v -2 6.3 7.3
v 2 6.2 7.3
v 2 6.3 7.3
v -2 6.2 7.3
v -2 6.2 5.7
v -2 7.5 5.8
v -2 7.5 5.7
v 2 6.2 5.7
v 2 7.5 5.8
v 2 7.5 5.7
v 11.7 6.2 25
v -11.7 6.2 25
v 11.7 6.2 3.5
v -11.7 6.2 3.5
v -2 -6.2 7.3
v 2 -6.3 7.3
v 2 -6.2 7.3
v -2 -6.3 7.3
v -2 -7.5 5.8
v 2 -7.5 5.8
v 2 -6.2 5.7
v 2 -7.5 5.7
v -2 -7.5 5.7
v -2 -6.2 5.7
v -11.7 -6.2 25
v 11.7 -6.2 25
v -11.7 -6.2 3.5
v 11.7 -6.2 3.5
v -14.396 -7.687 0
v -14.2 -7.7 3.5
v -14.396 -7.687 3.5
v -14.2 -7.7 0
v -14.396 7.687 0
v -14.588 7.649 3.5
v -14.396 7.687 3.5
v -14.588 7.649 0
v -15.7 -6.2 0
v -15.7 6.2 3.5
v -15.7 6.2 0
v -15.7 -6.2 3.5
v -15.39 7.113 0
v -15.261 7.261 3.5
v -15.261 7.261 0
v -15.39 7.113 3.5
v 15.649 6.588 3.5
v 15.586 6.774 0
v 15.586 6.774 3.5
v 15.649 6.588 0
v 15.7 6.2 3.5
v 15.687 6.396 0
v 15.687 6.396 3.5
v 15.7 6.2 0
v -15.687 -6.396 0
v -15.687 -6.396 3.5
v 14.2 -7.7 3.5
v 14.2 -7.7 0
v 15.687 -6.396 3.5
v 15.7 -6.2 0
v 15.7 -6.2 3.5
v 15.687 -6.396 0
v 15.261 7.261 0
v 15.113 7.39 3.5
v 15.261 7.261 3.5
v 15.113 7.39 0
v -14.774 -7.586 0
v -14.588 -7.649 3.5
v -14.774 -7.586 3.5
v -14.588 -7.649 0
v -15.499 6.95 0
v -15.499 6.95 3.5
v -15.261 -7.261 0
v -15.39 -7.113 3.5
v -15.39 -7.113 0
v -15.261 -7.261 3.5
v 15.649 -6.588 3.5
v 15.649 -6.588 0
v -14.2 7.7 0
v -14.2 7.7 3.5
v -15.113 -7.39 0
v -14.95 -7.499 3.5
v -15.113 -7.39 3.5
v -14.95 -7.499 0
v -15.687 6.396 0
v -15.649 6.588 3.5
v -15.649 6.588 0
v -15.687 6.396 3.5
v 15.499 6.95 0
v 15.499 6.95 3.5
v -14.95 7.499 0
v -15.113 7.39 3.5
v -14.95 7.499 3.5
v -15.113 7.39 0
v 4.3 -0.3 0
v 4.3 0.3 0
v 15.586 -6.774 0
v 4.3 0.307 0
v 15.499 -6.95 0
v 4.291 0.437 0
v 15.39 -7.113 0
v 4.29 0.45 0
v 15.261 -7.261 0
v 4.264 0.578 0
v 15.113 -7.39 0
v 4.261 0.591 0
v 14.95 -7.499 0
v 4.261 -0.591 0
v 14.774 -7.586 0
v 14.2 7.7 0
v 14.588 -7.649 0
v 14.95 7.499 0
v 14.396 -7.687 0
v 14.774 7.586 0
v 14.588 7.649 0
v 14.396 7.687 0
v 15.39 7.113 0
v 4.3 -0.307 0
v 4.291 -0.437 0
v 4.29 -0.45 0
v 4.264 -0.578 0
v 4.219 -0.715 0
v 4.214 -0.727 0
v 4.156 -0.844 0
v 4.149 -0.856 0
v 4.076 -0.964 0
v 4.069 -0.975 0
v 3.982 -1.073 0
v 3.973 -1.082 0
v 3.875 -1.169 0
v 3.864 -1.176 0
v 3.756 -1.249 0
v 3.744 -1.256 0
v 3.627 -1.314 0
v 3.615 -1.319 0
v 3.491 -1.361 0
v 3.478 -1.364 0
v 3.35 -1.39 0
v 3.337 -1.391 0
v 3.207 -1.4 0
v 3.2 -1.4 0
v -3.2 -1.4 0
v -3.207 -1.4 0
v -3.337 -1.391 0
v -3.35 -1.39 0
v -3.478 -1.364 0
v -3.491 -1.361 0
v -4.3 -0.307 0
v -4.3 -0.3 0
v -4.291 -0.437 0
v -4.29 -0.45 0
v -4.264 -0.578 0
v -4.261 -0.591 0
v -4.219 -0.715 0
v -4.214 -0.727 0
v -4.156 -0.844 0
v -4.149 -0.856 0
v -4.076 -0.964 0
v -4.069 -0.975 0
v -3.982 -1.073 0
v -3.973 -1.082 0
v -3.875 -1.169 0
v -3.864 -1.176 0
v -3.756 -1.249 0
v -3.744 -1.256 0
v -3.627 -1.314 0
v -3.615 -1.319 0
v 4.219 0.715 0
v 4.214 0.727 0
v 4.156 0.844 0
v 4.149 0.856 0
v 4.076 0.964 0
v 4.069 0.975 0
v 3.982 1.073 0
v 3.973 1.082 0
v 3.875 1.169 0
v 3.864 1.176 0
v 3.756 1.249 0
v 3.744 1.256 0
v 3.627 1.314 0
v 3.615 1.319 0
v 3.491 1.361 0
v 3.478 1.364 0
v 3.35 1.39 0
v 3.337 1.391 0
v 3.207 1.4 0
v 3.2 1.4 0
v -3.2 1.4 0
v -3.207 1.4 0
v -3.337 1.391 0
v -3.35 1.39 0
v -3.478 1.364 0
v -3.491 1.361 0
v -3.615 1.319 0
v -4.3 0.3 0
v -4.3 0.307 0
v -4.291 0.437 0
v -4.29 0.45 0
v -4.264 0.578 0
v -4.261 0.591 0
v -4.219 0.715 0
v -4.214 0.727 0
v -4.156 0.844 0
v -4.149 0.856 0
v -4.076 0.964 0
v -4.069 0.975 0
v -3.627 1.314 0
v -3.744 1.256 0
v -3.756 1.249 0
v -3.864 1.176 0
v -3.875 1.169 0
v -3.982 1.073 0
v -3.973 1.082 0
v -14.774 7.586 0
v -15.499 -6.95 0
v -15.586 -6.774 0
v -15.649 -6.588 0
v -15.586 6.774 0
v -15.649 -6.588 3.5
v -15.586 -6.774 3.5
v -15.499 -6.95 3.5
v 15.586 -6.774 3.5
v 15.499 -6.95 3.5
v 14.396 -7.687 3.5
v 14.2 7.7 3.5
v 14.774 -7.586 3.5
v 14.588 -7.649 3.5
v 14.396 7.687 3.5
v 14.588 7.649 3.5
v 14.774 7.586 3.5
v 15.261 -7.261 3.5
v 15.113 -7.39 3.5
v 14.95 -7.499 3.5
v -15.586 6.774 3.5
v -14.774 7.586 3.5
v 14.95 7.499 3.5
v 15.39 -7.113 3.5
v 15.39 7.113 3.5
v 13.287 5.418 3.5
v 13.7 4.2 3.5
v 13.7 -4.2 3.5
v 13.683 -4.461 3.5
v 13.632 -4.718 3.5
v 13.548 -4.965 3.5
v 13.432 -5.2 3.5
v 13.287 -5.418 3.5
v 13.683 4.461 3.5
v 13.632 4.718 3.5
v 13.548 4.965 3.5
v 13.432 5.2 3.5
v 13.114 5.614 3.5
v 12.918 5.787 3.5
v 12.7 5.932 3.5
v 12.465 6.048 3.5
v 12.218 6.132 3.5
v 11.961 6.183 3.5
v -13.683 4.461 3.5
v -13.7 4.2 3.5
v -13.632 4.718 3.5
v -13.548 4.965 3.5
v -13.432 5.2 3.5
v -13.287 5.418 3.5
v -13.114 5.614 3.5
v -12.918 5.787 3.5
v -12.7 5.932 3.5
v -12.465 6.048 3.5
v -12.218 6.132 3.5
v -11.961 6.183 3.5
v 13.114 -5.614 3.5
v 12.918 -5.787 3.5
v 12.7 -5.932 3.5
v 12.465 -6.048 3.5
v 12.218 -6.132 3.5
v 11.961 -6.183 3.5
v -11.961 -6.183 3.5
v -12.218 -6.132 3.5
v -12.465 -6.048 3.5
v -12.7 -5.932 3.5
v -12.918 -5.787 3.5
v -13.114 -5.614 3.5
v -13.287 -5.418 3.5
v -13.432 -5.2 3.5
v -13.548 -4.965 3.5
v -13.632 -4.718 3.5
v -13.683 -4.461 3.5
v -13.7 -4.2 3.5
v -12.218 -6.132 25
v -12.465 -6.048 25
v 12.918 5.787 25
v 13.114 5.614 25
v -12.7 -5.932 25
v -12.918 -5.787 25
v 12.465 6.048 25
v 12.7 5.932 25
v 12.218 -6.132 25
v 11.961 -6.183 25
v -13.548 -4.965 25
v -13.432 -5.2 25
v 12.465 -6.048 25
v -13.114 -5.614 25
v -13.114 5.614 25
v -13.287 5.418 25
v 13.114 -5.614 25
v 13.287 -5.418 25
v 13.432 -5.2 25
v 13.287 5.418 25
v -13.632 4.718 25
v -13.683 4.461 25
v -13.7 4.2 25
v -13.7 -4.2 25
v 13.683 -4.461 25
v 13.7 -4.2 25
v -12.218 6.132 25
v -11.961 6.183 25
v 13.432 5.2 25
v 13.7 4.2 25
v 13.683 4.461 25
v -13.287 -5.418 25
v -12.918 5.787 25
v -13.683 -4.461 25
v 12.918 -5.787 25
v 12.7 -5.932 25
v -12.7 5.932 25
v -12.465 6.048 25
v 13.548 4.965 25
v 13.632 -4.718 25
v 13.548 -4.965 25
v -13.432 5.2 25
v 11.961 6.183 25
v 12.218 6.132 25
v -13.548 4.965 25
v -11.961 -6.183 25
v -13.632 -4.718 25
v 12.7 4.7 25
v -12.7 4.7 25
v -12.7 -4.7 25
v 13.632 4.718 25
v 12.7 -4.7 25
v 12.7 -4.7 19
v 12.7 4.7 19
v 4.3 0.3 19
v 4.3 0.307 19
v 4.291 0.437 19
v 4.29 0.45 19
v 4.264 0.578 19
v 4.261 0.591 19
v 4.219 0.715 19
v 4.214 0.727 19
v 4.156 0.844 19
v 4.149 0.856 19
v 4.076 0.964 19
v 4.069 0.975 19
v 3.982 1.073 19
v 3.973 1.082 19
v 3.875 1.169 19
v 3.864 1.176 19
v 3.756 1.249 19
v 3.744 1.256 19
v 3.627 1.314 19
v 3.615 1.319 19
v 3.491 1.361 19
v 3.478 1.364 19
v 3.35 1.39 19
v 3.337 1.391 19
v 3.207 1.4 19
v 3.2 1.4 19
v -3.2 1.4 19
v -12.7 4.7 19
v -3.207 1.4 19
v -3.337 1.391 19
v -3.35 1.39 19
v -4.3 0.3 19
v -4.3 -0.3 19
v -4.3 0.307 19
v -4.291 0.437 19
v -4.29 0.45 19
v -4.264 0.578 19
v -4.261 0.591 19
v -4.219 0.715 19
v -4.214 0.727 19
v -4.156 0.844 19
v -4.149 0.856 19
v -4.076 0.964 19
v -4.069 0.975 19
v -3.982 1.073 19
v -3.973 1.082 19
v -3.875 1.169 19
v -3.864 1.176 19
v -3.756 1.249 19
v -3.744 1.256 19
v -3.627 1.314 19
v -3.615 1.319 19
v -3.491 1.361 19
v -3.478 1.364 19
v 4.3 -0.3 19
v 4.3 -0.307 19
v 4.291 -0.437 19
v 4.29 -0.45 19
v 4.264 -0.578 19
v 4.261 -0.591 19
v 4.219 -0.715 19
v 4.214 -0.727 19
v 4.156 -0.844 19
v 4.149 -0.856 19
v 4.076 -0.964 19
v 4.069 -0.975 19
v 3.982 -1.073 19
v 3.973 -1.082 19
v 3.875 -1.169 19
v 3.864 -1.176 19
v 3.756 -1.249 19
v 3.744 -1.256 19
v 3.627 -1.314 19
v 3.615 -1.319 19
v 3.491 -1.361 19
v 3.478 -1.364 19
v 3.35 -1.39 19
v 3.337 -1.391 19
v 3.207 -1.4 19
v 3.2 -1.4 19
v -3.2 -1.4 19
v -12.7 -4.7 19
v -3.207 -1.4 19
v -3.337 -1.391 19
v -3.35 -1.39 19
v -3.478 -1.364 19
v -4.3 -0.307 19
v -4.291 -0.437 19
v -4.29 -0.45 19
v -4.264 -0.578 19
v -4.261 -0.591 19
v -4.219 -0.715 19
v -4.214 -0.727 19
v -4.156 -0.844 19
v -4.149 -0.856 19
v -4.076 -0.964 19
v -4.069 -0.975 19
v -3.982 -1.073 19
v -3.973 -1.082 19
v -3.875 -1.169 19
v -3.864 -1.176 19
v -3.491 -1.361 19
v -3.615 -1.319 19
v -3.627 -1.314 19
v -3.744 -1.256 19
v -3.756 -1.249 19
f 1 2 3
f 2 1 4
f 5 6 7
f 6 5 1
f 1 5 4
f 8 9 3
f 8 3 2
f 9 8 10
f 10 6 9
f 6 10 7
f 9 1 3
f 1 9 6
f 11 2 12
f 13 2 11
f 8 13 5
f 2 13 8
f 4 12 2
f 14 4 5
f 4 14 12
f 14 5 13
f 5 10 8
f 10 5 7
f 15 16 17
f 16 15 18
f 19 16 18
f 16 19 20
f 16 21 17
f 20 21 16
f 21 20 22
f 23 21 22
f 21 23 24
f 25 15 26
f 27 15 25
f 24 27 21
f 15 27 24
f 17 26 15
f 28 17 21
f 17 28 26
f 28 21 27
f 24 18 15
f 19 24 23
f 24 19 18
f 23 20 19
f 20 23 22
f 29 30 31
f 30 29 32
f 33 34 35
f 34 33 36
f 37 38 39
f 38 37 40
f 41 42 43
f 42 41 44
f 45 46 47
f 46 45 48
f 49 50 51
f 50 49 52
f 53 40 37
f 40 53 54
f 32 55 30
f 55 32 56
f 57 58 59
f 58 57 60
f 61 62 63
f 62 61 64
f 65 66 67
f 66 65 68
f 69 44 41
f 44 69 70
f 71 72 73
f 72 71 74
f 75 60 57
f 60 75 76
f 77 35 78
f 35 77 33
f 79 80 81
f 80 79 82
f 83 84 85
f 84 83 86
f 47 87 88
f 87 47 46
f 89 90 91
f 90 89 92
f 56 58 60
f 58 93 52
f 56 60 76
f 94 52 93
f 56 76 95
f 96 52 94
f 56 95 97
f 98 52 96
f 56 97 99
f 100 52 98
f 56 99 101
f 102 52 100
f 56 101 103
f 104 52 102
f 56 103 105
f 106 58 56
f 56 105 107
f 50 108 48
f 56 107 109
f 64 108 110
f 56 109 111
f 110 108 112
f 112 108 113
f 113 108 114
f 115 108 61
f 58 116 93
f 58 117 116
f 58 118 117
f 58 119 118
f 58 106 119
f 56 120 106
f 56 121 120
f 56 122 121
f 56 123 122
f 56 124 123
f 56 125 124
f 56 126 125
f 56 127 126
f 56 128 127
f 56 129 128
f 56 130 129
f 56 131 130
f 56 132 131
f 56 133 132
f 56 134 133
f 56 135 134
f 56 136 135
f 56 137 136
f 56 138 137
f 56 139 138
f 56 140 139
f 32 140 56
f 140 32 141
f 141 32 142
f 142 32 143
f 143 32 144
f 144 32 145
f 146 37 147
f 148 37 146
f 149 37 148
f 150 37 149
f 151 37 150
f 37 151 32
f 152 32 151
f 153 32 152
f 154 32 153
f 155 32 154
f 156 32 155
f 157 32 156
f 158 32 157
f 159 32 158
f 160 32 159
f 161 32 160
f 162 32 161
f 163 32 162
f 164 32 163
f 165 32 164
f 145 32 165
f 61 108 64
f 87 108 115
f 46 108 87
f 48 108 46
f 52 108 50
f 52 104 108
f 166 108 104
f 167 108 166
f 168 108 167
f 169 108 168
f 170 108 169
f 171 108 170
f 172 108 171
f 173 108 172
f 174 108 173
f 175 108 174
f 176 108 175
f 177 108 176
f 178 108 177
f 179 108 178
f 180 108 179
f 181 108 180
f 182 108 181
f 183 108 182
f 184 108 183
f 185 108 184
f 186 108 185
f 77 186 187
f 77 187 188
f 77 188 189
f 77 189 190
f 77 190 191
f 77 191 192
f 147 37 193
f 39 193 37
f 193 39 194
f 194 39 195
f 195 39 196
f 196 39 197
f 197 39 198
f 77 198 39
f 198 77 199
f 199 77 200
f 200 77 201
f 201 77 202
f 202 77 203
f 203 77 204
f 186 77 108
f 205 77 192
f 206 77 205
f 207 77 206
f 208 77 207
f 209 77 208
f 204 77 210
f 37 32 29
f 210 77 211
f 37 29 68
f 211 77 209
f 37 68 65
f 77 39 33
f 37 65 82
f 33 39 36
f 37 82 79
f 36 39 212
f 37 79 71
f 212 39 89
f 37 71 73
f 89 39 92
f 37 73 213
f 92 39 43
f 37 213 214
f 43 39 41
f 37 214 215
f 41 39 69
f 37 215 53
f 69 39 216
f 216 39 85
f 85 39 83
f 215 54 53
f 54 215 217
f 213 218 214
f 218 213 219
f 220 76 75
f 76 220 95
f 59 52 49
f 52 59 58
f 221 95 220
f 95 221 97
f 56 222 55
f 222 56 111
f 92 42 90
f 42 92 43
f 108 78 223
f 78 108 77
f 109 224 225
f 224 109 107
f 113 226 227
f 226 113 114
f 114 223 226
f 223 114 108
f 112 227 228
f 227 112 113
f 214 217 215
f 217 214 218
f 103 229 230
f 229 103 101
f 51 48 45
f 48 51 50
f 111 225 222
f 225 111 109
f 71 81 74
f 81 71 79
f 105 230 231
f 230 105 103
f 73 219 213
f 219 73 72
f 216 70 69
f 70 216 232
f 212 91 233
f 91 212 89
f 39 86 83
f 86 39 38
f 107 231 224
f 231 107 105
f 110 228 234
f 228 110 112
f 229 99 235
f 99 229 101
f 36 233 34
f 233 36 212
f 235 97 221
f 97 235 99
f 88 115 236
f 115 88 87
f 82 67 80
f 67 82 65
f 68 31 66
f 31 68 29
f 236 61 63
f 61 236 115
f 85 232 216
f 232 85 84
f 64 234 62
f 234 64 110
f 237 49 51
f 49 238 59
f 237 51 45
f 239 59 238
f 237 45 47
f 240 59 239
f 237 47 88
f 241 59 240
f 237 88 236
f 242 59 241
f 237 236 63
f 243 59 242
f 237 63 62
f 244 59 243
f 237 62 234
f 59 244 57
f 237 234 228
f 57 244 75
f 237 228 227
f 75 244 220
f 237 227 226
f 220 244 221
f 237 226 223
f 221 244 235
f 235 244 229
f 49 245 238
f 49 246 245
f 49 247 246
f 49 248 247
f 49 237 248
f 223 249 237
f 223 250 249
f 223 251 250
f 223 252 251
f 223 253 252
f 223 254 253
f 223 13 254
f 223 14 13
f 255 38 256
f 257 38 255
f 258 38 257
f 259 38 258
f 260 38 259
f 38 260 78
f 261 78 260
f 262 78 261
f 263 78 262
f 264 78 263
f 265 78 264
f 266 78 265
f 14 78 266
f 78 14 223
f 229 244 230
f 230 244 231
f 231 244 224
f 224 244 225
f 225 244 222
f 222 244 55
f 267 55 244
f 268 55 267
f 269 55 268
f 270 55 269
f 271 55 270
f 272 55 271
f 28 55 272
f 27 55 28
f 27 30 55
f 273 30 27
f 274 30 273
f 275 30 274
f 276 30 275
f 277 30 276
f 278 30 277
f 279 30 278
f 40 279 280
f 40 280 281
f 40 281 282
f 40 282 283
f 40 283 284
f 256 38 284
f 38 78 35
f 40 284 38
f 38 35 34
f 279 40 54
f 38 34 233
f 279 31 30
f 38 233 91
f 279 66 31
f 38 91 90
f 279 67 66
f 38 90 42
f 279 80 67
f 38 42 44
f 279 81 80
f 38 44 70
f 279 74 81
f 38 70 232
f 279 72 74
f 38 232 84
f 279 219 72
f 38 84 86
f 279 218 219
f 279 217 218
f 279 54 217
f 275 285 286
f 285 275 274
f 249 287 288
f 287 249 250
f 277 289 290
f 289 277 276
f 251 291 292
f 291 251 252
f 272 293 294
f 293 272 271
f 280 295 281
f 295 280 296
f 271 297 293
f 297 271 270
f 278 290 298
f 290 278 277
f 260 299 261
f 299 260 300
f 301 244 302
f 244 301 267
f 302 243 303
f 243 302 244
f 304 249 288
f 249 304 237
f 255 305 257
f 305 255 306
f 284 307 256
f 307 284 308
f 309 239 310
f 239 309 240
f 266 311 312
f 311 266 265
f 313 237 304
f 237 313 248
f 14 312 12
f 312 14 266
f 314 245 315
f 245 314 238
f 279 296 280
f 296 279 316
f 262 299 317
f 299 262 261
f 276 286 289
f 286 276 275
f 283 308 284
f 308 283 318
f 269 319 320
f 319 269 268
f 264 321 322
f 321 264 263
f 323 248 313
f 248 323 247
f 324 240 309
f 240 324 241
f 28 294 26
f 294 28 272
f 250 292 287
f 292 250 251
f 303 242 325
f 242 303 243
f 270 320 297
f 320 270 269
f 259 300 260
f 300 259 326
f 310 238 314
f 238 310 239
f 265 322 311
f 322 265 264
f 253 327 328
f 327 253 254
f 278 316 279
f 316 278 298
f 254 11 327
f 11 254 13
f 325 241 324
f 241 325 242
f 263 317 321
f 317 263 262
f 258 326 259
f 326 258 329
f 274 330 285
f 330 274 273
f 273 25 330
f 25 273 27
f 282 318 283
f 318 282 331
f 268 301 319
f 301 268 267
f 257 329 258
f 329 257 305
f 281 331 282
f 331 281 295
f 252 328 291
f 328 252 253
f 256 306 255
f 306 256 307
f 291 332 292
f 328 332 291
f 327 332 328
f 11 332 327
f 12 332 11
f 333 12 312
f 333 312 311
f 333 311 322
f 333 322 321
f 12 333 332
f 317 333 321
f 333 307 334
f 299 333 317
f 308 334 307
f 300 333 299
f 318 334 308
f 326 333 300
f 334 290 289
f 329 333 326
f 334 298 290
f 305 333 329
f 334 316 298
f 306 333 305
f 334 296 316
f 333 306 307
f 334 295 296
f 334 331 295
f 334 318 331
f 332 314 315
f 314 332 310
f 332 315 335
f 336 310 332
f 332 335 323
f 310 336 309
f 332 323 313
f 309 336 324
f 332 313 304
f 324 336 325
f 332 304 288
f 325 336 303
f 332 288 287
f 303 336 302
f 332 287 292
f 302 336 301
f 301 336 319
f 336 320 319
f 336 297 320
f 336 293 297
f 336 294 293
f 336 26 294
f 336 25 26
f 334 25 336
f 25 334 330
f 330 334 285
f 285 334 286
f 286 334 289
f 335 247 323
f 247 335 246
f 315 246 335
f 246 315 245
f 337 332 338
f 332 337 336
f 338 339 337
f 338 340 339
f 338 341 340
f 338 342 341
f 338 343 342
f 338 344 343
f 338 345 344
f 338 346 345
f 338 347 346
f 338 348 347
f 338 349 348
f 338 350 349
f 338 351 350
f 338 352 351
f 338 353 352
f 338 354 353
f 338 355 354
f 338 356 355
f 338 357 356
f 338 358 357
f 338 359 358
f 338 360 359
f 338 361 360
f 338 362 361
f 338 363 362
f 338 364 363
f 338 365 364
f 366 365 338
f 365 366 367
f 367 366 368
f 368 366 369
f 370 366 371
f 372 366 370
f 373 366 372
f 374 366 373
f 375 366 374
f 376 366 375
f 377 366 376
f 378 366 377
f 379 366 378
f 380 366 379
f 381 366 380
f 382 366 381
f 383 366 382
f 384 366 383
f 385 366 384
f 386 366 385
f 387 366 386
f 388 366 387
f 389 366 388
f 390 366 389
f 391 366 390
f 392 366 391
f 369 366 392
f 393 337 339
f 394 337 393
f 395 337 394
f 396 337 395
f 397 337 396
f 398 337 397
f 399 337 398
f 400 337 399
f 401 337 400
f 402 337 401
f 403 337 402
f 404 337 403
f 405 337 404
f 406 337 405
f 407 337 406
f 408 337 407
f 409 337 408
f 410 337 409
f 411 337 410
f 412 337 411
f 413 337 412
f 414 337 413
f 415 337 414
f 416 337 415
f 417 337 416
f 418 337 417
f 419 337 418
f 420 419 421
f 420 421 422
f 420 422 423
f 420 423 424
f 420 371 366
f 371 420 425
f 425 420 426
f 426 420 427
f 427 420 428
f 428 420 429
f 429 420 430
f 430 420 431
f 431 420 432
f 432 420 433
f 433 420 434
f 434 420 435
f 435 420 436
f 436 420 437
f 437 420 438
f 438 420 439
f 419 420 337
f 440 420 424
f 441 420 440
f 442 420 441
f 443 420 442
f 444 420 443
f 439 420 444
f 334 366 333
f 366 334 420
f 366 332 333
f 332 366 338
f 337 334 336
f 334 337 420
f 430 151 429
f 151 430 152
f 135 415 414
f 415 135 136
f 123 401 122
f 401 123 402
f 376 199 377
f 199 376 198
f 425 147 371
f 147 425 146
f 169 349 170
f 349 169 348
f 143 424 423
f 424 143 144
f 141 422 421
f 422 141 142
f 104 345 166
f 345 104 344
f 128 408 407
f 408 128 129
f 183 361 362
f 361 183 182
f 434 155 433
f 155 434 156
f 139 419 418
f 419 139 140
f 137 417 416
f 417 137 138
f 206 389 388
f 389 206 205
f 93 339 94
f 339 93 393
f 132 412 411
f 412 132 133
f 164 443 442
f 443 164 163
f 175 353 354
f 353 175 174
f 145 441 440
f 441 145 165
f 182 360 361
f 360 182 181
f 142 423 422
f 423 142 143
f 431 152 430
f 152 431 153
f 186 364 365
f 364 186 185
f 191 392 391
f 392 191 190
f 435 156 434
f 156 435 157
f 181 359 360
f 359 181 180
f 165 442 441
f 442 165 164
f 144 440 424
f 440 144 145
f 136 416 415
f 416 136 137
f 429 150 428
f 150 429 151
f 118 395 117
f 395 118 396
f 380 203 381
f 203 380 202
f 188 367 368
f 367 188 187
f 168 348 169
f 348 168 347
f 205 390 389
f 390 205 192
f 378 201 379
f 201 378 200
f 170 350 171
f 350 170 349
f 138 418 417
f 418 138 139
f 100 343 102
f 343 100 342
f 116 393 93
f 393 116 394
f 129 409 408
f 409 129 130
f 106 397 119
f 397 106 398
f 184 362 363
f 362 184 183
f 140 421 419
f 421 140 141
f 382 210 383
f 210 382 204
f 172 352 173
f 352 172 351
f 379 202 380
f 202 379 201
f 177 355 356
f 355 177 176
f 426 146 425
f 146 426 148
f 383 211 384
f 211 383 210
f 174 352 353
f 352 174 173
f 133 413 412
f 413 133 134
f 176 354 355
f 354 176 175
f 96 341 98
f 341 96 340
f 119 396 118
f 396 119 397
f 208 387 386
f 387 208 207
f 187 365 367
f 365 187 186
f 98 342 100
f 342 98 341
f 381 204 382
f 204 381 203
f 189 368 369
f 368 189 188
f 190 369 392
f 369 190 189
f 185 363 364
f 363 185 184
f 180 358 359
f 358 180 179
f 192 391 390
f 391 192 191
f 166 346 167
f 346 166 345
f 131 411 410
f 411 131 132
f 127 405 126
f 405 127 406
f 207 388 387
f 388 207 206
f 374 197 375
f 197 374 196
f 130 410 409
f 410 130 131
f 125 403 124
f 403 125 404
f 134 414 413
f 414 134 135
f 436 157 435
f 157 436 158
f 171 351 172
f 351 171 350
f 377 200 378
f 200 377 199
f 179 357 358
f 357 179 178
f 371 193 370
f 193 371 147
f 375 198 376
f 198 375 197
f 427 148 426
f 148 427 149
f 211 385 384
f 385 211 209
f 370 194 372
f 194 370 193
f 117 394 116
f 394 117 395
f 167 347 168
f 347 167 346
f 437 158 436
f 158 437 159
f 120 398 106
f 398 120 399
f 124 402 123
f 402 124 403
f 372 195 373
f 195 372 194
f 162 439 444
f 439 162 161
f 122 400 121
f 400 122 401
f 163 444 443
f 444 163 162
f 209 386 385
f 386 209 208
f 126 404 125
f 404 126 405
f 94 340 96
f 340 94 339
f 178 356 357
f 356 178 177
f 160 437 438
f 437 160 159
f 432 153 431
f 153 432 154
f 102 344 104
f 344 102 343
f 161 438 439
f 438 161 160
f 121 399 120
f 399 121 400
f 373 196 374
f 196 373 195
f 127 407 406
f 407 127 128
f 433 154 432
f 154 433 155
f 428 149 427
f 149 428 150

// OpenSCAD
// file: parameters.scad
// ============================================
// MODULAR CABLE ORGANIZER - SHARED PARAMETERS
// ============================================
// All dimensions in mm - include this in all files
// ============================================

$fn = 48;

// === TOLERANCES ===
clearance = 0.3;
port_clearance = 0.1;  // Extra clearance for port openings (reduced - 0.2 was too loose for USB-C)
wall = 1.6;

// === SLOT DIMENSIONS (2:1 aspect ratio) - scaled to 2/3 ===
slot_width = 32;  // Standard wide slot for larger connectors
slot_width_narrow = 16;  // Narrow slot for compact connectors (USB-C, micro-USB, USB-A, Lightning, 3.5mm)
slot_height = 16;  // Height is same for both wide and narrow
slot_depth = 4;  // Reduced from 6mm - less frame depth needed

// === FRAME STRUCTURE ===
frame_wall = 2.0;   // Wall between slots - 6 layers @ 0.4mm nozzle for strength
frame_border = 6;  // Increased by 10mm for mounting holes with countersink
frame_back = 2;     // Slightly thicker for snap catch strength
mount_hole_dia = 3;
countersink_dia = 6;  // Diameter of countersink for screw heads
countersink_depth = 2;  // Depth of countersink

// === DEFAULT GRID (can be overridden in individual files) ===
grid_cols = 2;
grid_rows = 2;

// === INSERT BASE DIMENSIONS ===
insert_width = slot_width - (2 * clearance);
insert_height = slot_height - (2 * clearance);
insert_base_depth = slot_depth - 0.5;

// === NARROW INSERT BASE DIMENSIONS ===
insert_width_narrow = slot_width_narrow - (2 * clearance);
insert_height_narrow = slot_height - (2 * clearance);

// === INSERT BODY (protrudes from frame) ===
insert_body_width = insert_width - 4;
insert_body_height = insert_height - 3;
insert_body_depth = 15.5;  // Standardized depth (USB-B 15.26mm + 0.25mm buffer) - all inserts same height
insert_top_thick = 1.5;  // Top platform thickness

// === NARROW INSERT BODY (protrudes from frame) ===
insert_body_width_narrow = insert_width_narrow - 4;
insert_body_height_narrow = insert_height_narrow - 3;

// === SNAP TABS (on neck/body - catch on back plate) ===
snap_tab_width = 4;
snap_tab_protrude = 1.2;  // How far tab sticks out from body
snap_tab_thick = 1.5;     // Z thickness of tab
snap_tab_offset = 2.2;      // Distance from base to tab bottom on insert (increased to clear frame)

// === CONNECTOR PORT DIMENSIONS & BODY DEPTHS ===
// Port dimensions from reference blueprints
// Body depths sized to match typical male connector lengths

// USB-C: 8.4 x 2.6mm, male connector ~9mm
usbc_w = 8.4;
usbc_h = 2.6;
usbc_r = 1.0;
usbc_body_depth = 15.5;  // Standardized depth (USB-B 15.26mm + 0.25mm buffer)
// NO RETENTION RIBS for USB-C (removed per user request)

// USB-A: 13.0 x 4.5mm (standard male USB-A height)
usba_w = 13.0;
usba_h = 4.5;  // Match actual male USB-A height
usba_r = 0.5;
usba_body_depth = 15.5;  // Standardized depth (USB-B 15.26mm + 0.25mm buffer)
usba_retention_rib_depth = 5.0;  // Distance from front (moved back 1mm so ribs don't break)
usba_retention_rib_size = 0.15;  // How far ribs protrude inward

// USB Mini: 6.9 x 3.0mm, male connector ~9mm
usb_mini_w = 6.9;
usb_mini_h = 3.0;
usb_mini_r = 0.5;
usb_mini_body_depth = 15.5;  // Standardized depth (USB-B 15.26mm + 0.25mm buffer)
usb_mini_retention_rib_depth = 3.5;  // Distance from front where retention ribs start
usb_mini_retention_rib_size = 0.125;  // Reduced to half (was 0.25)

// USB Micro-B: 7.4 x 1.8mm (wider to fit corners of trapezoid)
usb_micro_w = 7.4;  // Increased width for corners
usb_micro_h = 1.8;
usb_micro_r = 0.3;
usb_micro_body_depth = 15.5;  // Standardized depth (USB-B 15.26mm + 0.25mm buffer)
usb_micro_retention_rib_depth = 4.5;  // Distance from front (moved back 1mm so ribs don't break)
usb_micro_retention_rib_size = 0.125;  // How far ribs protrude inward

// USB-B: 8.75 x 7.78mm (standard male USB-B height)
usb_b_w = 8.75;  // Width at bottom (wider)
usb_b_h = 7.78;  // Match actual male USB-B height (reduced from 7.9)
usb_b_r = 0.6;   // Corner radius
usb_b_top_inset = 0.9;  // How much narrower the top is (creates trapezoid shape)
usb_b_body_depth = 15.5;  // Standardized depth (15.26mm connector + 0.25mm buffer)
usb_b_retention_rib_depth = 5.5;  // Distance from front (moved back 1mm so ribs don't break)
usb_b_retention_rib_size = 0.15;  // How far ribs protrude inward

// Lightning: 7.6 x 1.5mm, male connector ~8mm (measured from actual connector)
lightning_w = 7.6;
lightning_h = 1.5;
lightning_r = 0.5;
lightning_body_depth = 15.5;  // Standardized depth (USB-B 15.26mm + 0.25mm buffer)
lightning_retention_rib_depth = 4.0;  // Distance from front (moved back 1mm so ribs don't break)
lightning_retention_rib_size = 0.1;   // How far ribs protrude inward

// HDMI: 14.65 x 4.45mm (standard male HDMI height)
hdmi_w = 14.65;
hdmi_h = 4.45;  // Match actual male HDMI height
hdmi_r = 0.5;
hdmi_body_depth = 15.5;  // Standardized depth (USB-B 15.26mm + 0.25mm buffer)
hdmi_retention_rib_depth = 6.0;  // Distance from front (moved back 1mm so ribs don't break)
hdmi_retention_rib_size = 0.1;   // How far ribs protrude inward

// 3.5mm Audio Jack: standard 3.5mm (1/8") diameter
audio_jack_dia = 3.6;  // 3.5mm + 0.1mm for less snug fit
audio_jack_body_depth = 15.5;  // Standardized depth (USB-B 15.26mm + 0.25mm buffer)
// Ring positions for TRS/TRRS ribs (tip, ring1, ring2 from front)
audio_jack_ring1 = 3.5;  // First ring position from front
audio_jack_ring2 = 6.5;  // Second ring position from front

// Blank/Label: recessed area for label
label_w = 30;
label_h = 12;
label_depth = 0.8;

// AC Power Plug: asymmetric holes for polarity (US 2-prong)
// Prongs are VERTICAL (tall and thin)
// Hot prong (narrower): 1.6mm wide x 6.5mm tall
// Neutral prong (wider): 1.6mm wide x 8.5mm tall (increased)
power_hot_w = 1.6;   // Width (thin dimension)
power_hot_h = 6.5;   // Height (tall dimension)
power_neutral_w = 1.6;   // Width (thin dimension)
power_neutral_h = 8.5;   // Height (tall dimension, increased from 8.1)
power_prong_spacing = 12.7;  // 0.5" center-to-center
power_body_depth = 15.5;  // Standardized depth (USB-B 15.26mm + 0.25mm buffer)

// === CALCULATED VALUES ===
frame_total_depth = frame_back + slot_depth;
grid_width = (grid_cols * slot_width) + ((grid_cols - 1) * frame_wall);
grid_height = (grid_rows * slot_height) + ((grid_rows - 1) * frame_wall);
frame_width = grid_width + (2 * frame_border);
frame_height_total = grid_height + (2 * frame_border);
insert_total_depth = insert_base_depth + insert_body_depth;
// main file
// ============================================
// PRINT FILE: Universal USB-C Adapter Insert
// ============================================
// Accepts USB-C male connector on front
// Routes to 24-pin universal interface on rear
// ============================================

include <insert_universal_base.scad>

// Render the universal USB-C adapter
insert_universal_usbc();
